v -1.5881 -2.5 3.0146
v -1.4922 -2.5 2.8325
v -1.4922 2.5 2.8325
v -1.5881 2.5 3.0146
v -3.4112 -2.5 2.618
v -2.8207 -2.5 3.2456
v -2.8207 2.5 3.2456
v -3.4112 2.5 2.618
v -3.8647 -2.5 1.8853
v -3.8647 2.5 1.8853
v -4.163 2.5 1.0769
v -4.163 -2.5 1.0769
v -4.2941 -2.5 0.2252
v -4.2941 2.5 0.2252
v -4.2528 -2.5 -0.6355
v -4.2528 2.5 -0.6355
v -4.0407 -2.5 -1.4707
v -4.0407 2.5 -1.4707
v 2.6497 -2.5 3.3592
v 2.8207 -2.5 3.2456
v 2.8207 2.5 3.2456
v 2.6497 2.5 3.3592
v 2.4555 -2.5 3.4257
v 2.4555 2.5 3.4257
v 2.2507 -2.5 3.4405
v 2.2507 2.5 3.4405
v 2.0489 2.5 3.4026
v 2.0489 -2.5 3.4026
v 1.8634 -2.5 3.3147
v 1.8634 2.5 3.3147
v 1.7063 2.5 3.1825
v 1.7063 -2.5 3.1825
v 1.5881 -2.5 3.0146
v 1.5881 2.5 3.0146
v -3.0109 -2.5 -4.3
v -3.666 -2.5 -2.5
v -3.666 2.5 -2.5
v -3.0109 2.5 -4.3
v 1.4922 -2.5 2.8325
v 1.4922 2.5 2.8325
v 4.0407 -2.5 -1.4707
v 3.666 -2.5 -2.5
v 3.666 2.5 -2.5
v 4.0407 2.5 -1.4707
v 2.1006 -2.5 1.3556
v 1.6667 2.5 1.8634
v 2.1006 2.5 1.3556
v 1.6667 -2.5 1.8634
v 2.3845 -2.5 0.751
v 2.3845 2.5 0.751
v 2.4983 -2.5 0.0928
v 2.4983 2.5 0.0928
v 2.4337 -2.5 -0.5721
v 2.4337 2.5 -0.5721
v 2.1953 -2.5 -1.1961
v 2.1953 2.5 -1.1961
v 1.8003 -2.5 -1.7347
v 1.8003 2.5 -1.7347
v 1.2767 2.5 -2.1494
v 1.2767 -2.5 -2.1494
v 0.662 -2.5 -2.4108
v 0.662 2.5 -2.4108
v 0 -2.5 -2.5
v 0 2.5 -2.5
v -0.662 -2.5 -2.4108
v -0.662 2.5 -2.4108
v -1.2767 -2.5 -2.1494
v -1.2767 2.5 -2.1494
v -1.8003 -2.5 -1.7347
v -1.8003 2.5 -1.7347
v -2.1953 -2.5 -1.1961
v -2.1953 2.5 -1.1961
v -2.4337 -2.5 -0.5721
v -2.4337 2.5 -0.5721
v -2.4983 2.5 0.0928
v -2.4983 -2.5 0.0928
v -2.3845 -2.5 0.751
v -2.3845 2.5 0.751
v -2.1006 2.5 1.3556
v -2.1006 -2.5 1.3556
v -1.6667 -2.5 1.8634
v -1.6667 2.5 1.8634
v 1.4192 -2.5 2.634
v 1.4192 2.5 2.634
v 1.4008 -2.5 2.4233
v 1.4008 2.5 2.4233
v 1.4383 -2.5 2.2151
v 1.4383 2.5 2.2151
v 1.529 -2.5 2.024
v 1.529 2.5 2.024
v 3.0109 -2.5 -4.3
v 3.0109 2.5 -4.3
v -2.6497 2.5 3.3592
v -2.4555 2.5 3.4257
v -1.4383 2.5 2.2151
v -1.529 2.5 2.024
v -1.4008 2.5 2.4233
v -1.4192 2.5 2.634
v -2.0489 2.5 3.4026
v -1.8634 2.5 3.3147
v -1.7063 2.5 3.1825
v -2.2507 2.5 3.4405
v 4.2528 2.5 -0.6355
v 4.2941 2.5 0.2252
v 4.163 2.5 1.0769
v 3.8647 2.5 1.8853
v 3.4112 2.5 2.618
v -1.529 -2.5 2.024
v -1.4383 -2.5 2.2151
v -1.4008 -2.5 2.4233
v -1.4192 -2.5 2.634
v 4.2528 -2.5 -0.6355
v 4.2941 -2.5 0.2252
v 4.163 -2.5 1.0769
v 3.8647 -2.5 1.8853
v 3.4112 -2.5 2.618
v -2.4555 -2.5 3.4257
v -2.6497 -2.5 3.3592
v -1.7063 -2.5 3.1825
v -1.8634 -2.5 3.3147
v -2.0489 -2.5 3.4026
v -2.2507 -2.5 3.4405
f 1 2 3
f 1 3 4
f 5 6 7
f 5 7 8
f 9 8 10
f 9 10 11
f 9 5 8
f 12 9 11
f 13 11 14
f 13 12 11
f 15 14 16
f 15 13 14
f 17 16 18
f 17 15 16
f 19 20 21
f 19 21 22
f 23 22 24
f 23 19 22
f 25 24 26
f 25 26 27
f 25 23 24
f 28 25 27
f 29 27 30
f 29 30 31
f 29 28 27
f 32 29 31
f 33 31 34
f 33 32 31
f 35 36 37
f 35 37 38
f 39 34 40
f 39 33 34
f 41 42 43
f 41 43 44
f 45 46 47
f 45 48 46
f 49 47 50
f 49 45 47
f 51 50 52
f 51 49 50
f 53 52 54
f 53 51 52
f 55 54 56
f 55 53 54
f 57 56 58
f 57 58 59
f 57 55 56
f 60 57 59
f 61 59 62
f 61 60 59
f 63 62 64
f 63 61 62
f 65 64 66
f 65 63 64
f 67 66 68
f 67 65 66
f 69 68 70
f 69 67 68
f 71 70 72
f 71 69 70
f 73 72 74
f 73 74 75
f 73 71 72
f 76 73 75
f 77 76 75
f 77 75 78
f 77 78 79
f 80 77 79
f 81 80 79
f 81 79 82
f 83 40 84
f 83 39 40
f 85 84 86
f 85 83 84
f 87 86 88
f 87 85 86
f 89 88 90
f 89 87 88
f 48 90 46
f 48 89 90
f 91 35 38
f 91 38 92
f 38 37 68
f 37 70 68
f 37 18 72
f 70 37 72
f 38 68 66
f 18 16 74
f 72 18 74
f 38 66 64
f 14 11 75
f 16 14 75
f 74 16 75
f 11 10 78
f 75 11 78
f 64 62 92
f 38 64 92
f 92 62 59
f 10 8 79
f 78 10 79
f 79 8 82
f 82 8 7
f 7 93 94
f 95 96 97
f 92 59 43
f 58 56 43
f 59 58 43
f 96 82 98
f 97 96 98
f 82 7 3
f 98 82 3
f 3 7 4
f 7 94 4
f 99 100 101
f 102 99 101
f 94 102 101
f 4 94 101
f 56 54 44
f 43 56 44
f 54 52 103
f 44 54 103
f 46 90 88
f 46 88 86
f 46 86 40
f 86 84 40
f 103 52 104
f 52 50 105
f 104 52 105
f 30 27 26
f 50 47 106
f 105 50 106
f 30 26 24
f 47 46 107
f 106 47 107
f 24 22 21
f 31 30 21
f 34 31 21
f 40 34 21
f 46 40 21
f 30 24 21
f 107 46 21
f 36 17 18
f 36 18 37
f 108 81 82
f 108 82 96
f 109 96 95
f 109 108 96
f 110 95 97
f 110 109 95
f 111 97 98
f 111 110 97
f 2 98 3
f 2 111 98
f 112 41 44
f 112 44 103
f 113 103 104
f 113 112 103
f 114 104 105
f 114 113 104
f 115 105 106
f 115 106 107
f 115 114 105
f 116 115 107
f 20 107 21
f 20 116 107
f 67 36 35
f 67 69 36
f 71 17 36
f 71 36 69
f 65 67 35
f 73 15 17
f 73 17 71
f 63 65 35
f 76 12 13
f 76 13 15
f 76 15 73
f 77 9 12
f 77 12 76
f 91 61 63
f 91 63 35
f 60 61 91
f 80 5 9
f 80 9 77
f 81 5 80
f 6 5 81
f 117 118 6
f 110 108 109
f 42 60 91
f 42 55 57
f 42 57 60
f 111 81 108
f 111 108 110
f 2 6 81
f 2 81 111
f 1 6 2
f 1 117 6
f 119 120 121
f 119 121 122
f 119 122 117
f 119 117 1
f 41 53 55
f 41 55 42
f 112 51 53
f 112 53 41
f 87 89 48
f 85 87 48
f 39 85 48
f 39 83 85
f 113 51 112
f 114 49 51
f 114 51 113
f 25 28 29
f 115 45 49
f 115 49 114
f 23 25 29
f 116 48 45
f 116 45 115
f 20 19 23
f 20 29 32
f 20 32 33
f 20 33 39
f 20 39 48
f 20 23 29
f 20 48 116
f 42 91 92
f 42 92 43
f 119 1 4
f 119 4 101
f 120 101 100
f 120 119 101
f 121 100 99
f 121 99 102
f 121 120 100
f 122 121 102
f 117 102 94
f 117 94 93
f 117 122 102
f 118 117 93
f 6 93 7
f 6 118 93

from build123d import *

# Parameters (mm, degrees)
F1_DEPTH = 2.5


with BuildPart() as f1:
    # F0 (on Front) → F1 (new body, symmetric)
    with BuildSketch(Plane.XZ):
        with BuildLine():
            ThreePointArc((0, -2.5), (-2.3354308974, -0.8920552244), (-1.6666666667, 1.8633899812))
            ThreePointArc((-1.6666666667, 1.8633899812), (-1.4126546867, 2.3179448999), (-1.49220925, 2.8325450666))
            Line((-1.49220925, 2.8325450666), (-1.5881221571, 3.0146090981))
            ThreePointArc((-1.5881221571, 3.0146090981), (-2.1485753305, 3.4280540352), (-2.8206930002, 3.2455648197))
            ThreePointArc((-2.8206930002, 3.2455648197), (-4.1629749971, 1.0768654389), (-4.0406782694, -1.4706866163))
            ThreePointArc((-4.0406782694, -1.4706866163), (-3.8045948422, -2.0037609855), (-3.4985711369, -2.5))
            Line((-3.4985711369, -2.5), (0, -2.5))
        make_face()
        with BuildLine():
            ThreePointArc((1.6666666667, 1.8633899812), (2.3354308974, -0.8920552244), (0, -2.5))
            Line((0, -2.5), (3.4985711369, -2.5))
            ThreePointArc((3.4985711369, -2.5), (3.8045948422, -2.0037609855), (4.0406782694, -1.4706866163))
            ThreePointArc((4.0406782694, -1.4706866163), (4.1629749971, 1.0768654389), (2.8206930002, 3.2455648197))
            ThreePointArc((2.8206930002, 3.2455648197), (2.1485753305, 3.4280540352), (1.5881221571, 3.0146090981))
            Line((1.5881221571, 3.0146090981), (1.49220925, 2.8325450666))
            ThreePointArc((1.49220925, 2.8325450666), (1.4126546867, 2.3179448999), (1.6666666667, 1.8633899812))
        make_face()
        with BuildLine():
            Line((-3.666038836, -2.5), (-3.4985711369, -2.5))
            ThreePointArc((-3.4985711369, -2.5), (-3.8045948422, -2.0037609855), (-4.0406782694, -1.4706866163))
            Line((-4.0406782694, -1.4706866163), (-3.666038836, -2.5))
        make_face()
        with BuildLine():
            ThreePointArc((0, -4.3), (-1.9672315573, -3.8236108589), (-3.4985711369, -2.5))
            Line((-3.4985711369, -2.5), (-3.666038836, -2.5))
            Line((-3.666038836, -2.5), (-3.0108924143, -4.3))
            Line((-3.0108924143, -4.3), (0, -4.3))
        make_face()
        with BuildLine():
            Line((3.666038836, -2.5), (3.4985711369, -2.5))
            ThreePointArc((3.4985711369, -2.5), (1.9672315573, -3.8236108589), (0, -4.3))
            Line((0, -4.3), (3.0108924143, -4.3))
            Line((3.0108924143, -4.3), (3.666038836, -2.5))
        make_face()
        with BuildLine():
            Line((3.4985711369, -2.5), (0, -2.5))
            Line((0, -2.5), (-3.4985711369, -2.5))
            ThreePointArc((-3.4985711369, -2.5), (-1.9672315573, -3.8236108589), (0, -4.3))
            ThreePointArc((0, -4.3), (1.9672315573, -3.8236108589), (3.4985711369, -2.5))
        make_face()
        with BuildLine():
            ThreePointArc((0, -4.3), (-1.9672315573, -3.8236108589), (-3.4985711369, -2.5))
            Line((-3.4985711369, -2.5), (-3.666038836, -2.5))
            Line((-3.666038836, -2.5), (-3.0108924143, -4.3))
            Line((-3.0108924143, -4.3), (0, -4.3))
        make_face()
        with BuildLine():
            ThreePointArc((4.0406782694, -1.4706866163), (3.8045948422, -2.0037609855), (3.4985711369, -2.5))
            Line((3.4985711369, -2.5), (3.666038836, -2.5))
            Line((3.666038836, -2.5), (4.0406782694, -1.4706866163))
        make_face()
    extrude(amount=F1_DEPTH, both=True)


solid = f1.part
